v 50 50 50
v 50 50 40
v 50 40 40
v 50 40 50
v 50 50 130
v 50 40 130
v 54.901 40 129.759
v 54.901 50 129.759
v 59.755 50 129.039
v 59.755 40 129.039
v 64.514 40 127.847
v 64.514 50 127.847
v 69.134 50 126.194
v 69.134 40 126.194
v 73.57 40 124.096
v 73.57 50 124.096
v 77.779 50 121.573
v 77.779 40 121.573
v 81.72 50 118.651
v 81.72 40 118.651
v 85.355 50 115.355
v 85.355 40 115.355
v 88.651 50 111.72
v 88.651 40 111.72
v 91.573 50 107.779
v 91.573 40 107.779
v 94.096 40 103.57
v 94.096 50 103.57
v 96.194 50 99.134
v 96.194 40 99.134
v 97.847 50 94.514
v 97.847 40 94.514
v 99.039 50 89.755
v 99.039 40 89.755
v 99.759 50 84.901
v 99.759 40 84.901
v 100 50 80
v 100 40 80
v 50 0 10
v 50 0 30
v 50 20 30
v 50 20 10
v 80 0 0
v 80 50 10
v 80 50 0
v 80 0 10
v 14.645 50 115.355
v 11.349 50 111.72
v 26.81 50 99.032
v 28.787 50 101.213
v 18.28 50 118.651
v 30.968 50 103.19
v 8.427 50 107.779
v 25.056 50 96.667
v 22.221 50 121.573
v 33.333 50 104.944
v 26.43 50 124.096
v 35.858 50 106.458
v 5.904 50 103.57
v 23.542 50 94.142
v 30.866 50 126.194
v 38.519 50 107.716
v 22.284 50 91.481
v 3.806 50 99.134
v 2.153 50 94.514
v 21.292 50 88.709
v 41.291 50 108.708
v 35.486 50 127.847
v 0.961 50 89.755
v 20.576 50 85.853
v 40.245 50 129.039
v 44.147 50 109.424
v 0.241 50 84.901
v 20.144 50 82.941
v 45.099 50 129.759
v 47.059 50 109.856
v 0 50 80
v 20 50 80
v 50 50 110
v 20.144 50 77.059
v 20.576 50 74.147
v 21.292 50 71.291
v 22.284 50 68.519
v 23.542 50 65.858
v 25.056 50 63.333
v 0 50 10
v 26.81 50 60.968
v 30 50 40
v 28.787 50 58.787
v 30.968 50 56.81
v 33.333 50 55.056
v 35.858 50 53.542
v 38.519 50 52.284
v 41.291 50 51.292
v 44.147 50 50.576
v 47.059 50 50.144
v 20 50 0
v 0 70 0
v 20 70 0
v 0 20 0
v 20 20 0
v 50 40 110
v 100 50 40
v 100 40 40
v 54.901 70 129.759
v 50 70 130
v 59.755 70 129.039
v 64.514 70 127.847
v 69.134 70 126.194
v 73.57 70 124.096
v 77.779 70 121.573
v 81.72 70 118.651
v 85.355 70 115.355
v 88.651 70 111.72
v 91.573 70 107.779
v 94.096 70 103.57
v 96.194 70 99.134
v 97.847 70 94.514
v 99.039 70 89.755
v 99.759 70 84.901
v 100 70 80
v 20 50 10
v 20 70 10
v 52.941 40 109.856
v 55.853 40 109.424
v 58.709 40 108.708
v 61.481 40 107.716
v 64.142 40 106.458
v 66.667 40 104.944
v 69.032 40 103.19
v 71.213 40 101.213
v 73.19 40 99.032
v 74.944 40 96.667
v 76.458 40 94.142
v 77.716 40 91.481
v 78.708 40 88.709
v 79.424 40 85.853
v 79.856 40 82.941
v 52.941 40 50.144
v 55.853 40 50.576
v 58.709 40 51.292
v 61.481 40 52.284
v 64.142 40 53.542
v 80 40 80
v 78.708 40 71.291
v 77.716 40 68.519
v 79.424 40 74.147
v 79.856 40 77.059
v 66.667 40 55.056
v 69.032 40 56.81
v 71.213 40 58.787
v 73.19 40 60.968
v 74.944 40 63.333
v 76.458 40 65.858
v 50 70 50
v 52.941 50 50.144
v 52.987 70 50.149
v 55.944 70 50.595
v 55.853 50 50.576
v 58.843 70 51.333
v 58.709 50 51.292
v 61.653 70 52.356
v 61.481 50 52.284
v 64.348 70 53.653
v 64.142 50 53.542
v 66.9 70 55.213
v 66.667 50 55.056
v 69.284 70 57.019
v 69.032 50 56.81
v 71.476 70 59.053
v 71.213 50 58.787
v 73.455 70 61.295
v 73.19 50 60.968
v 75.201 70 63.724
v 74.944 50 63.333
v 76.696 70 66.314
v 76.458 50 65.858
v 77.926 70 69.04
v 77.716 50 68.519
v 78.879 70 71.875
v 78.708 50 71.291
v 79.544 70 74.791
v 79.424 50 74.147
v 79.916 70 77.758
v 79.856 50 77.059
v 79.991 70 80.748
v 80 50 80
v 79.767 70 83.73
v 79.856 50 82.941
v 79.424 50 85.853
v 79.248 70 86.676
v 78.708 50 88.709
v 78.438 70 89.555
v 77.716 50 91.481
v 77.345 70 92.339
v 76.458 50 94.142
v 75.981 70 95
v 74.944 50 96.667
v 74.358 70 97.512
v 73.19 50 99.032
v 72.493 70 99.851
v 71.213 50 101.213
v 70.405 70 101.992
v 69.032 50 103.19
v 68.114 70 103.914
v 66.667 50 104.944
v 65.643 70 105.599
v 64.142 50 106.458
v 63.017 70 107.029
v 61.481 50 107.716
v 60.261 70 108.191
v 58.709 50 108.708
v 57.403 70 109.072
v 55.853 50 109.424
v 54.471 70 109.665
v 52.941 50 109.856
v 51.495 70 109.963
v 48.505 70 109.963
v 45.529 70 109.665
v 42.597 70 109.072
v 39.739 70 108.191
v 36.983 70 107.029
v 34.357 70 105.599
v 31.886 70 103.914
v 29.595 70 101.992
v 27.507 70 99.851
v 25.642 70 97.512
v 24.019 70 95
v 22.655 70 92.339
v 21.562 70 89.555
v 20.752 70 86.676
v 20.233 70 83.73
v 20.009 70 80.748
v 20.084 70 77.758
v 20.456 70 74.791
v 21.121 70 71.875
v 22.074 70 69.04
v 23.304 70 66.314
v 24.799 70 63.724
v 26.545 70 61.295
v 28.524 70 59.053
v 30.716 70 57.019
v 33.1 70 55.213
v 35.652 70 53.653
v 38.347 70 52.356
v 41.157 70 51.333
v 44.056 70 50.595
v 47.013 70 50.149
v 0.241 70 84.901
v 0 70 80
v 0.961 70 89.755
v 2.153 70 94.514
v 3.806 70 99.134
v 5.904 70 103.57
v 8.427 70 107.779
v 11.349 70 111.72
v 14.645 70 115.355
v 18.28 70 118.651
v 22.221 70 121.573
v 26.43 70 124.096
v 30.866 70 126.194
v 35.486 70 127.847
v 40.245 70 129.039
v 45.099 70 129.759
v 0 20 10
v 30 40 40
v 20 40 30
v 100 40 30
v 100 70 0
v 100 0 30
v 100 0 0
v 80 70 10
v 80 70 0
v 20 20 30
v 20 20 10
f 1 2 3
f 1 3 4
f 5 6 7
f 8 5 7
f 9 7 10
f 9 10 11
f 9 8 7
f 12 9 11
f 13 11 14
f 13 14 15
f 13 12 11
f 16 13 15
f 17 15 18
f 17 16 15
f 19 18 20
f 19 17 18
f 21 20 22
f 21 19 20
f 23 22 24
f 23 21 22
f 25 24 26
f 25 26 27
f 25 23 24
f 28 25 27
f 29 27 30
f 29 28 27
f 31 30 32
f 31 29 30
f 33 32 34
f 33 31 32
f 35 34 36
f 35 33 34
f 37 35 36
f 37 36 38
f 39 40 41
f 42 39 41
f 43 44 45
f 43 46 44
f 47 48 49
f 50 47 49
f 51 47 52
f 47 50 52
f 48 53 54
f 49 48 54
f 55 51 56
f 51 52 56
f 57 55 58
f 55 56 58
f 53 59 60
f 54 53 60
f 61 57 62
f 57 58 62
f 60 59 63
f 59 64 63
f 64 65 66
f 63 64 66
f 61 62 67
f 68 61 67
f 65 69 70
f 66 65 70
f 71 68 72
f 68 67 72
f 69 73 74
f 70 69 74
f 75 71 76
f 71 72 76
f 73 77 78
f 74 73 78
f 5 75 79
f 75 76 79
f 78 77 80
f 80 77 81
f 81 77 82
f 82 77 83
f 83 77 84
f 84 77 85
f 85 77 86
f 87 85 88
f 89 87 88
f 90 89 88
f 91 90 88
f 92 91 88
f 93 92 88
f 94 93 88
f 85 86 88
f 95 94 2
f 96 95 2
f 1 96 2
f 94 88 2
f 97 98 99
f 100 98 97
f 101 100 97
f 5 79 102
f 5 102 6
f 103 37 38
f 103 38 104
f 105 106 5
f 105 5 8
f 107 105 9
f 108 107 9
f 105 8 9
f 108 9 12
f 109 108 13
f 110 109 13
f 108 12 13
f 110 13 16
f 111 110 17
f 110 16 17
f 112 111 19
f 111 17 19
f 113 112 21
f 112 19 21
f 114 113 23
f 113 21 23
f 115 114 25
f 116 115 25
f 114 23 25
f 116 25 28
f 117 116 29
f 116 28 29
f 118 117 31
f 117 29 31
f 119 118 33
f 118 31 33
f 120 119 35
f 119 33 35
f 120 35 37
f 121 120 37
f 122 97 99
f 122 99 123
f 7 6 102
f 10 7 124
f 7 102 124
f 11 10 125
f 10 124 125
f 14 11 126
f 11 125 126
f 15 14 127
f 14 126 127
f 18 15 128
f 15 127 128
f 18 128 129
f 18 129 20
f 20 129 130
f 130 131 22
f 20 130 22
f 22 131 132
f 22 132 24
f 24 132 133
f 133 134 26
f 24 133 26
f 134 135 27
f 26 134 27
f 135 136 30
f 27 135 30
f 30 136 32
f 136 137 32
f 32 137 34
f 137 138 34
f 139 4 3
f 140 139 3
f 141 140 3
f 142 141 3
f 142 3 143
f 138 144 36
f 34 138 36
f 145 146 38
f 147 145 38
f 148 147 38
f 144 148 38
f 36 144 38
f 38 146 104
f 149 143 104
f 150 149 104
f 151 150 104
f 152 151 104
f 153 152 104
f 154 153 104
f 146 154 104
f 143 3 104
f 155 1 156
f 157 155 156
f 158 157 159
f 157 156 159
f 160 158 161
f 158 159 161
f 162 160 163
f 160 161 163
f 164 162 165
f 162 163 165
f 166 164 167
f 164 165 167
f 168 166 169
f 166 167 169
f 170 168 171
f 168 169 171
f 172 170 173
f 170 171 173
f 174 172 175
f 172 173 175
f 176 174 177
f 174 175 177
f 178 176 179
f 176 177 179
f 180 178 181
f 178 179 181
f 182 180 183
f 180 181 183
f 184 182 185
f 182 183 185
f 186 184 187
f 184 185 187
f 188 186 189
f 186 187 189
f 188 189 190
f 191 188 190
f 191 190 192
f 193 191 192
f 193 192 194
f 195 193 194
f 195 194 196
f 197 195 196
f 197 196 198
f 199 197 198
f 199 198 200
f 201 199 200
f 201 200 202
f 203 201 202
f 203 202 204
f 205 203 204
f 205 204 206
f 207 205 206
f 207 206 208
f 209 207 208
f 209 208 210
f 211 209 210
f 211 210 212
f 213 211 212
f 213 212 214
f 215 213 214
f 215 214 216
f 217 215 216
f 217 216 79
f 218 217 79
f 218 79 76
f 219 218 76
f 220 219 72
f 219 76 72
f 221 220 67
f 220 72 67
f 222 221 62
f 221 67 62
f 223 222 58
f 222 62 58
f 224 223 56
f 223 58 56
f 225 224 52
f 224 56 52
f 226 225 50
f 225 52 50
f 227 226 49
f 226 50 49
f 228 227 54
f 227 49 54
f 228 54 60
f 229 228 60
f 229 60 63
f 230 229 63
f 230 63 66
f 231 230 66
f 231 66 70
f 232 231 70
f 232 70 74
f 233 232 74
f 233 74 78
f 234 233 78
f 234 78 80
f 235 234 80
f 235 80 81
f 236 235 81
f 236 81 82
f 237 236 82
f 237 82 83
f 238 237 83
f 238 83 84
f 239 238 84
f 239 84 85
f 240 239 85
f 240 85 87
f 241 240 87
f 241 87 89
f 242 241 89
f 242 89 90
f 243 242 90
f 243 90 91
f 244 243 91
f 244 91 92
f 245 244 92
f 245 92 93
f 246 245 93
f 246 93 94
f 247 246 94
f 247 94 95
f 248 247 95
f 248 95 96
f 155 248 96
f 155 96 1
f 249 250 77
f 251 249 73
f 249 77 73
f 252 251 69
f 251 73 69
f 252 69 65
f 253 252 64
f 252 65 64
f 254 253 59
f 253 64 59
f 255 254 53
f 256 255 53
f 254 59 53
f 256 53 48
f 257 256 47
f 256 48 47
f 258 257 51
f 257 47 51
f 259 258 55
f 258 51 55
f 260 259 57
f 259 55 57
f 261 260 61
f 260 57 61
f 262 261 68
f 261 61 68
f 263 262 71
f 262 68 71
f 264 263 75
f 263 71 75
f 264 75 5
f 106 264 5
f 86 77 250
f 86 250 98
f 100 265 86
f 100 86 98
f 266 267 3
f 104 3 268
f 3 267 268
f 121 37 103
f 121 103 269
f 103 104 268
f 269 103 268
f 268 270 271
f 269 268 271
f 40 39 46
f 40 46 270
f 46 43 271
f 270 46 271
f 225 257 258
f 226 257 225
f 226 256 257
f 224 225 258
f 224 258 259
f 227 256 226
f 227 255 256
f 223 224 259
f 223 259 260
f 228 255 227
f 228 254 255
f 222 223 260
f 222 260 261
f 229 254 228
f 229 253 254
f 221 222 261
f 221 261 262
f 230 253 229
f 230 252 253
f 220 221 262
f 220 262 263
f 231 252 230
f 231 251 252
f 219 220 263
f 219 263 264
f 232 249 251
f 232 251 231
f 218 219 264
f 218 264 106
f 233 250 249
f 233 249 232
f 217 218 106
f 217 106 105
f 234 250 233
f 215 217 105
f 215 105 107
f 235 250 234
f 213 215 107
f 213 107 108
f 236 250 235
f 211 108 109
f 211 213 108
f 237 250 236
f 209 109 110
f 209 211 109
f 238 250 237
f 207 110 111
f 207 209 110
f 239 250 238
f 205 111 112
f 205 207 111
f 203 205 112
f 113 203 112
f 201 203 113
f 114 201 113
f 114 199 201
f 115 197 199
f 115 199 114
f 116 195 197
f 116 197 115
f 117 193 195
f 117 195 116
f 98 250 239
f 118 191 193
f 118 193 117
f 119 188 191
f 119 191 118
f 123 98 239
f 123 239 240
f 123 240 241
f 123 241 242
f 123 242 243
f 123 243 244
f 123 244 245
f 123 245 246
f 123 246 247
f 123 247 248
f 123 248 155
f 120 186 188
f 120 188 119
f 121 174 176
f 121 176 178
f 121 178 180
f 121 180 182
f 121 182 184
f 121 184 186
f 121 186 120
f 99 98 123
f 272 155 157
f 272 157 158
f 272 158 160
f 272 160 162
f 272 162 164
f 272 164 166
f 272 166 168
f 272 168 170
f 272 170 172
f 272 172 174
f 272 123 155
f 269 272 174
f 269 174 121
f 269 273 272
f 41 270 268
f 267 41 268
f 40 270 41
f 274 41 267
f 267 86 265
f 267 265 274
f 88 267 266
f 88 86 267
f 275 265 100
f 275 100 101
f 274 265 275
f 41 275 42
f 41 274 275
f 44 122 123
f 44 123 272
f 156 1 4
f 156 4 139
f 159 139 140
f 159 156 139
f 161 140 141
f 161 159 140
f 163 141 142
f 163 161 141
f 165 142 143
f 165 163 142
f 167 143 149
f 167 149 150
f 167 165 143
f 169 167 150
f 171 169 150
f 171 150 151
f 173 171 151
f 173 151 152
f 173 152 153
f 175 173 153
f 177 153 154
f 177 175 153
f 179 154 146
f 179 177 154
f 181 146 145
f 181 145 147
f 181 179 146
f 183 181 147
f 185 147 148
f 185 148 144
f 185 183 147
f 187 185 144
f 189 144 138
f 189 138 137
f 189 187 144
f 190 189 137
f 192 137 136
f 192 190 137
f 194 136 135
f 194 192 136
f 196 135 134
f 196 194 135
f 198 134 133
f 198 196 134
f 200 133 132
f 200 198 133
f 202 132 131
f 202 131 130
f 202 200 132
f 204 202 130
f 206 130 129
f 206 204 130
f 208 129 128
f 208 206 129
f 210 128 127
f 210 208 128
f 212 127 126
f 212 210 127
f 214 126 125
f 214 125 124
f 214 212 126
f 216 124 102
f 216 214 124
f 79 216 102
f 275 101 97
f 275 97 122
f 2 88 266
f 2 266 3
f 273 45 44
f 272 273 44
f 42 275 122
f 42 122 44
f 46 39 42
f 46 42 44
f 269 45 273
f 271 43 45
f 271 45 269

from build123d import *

# Parameters (mm, degrees)
SKETCH1_W           = 100
SKETCH1_H           = 40
BOSS_EXTRUDE1_DEPTH = 30
SKETCH2_W           = 50
SKETCH2_H           = 20
CUT_EXTRUDE1_DEPTH  = 30
SKETCH3_W           = 60
SKETCH3_H           = 10
CUT_EXTRUDE3_DEPTH  = 110
BOSS_EXTRUDE2_DEPTH = 10
SKETCH5_W           = 100
SKETCH5_H           = 10
BOSS_EXTRUDE3_DEPTH = 10
CUT_EXTRUDE4_DEPTH  = 45
SKETCH7_W           = 100
SKETCH7_H           = 130
BOSS_EXTRUDE4_DEPTH = 20
SKETCH8_R           = 30
CUT_EXTRUDE5_DEPTH  = 20
CUT_EXTRUDE6_DEPTH  = 20
BOSS_EXTRUDE5_DEPTH = 10
SKETCH12_W          = 60
SKETCH12_H          = 10
CUT_EXTRUDE9_DEPTH  = 56


with BuildPart() as part:
    # Sketch1 → Boss-Extrude1 (new body)
    with BuildSketch(Plane.XY):
        with Locations((50, 20)):
            Rectangle(SKETCH1_W, SKETCH1_H)
    extrude(amount=BOSS_EXTRUDE1_DEPTH)

    # Sketch2 → Cut-Extrude1 (cut)
    with BuildSketch(Plane.XY.offset(30)):
        with Locations((25, 10)):
            Rectangle(SKETCH2_W, SKETCH2_H)
    extrude(amount=-CUT_EXTRUDE1_DEPTH, mode=Mode.SUBTRACT)

    # Sketch3 → Cut-Extrude3 (cut)
    with BuildSketch(Plane(origin=(0, 40, 0), x_dir=(1, 0, 0), z_dir=(0, 1, 0))):
        with Locations((50, -5)):
            Rectangle(SKETCH3_W, SKETCH3_H)
    extrude(amount=-CUT_EXTRUDE3_DEPTH, mode=Mode.SUBTRACT)

    # Sketch4 → Boss-Extrude2 (add)
    with BuildSketch(Plane(origin=(0, 40, 0), x_dir=(1, 0, 0), z_dir=(0, 1, 0))):
        Polygon((100, 0), (100, -30), (0, -30), (0, 0), (20, 0), (20, -10), (80, -10), (80, 0), align=None)
    extrude(amount=BOSS_EXTRUDE2_DEPTH)

    # Sketch5 → Boss-Extrude3 (add)
    with BuildSketch(Plane.XY.offset(30)):
        with Locations((50, 45)):
            Rectangle(SKETCH5_W, SKETCH5_H)
    extrude(amount=BOSS_EXTRUDE3_DEPTH)

    # Sketch6 → Cut-Extrude4 (cut)
    with BuildSketch(Plane(origin=(0, 50, 0), x_dir=(1, 0, 0), z_dir=(0, 1, 0))):
        Polygon((0, -10), (30, -40), (0, -40), align=None)
    extrude(amount=-CUT_EXTRUDE4_DEPTH, mode=Mode.SUBTRACT)

    # Sketch7 → Boss-Extrude4 (add)
    with BuildSketch(Plane(origin=(0, 50, 0), x_dir=(1, 0, 0), z_dir=(0, 1, 0))):
        with Locations((50, -65)):
            Rectangle(SKETCH7_W, SKETCH7_H)
    extrude(amount=BOSS_EXTRUDE4_DEPTH)

    # Sketch8 → Cut-Extrude5 (cut)
    with BuildSketch(Plane.XZ.offset(-50)):
        with Locations(Location((50, 80, 0), (0, 0, 270))):
            Circle(SKETCH8_R)
    extrude(amount=-CUT_EXTRUDE5_DEPTH, mode=Mode.SUBTRACT)

    # Sketch9 → Cut-Extrude6 (cut)
    with BuildSketch(Plane(origin=(0, 50, 0), x_dir=(-1, 0, 0), z_dir=(0, -1, 0))):
        with BuildLine():
            Line((0, -130), (0, -80))
            ThreePointArc((0, -80), (-14.644660941, -115.355339059), (-50, -130))
            Line((-50, -130), (0, -130))
        make_face()
        with BuildLine():
            Line((-100, -130), (-50, -130))
            ThreePointArc((-50, -130), (-85.355339059, -115.355339059), (-100, -80))
            Line((-100, -80), (-100, -130))
        make_face()
    extrude(amount=-CUT_EXTRUDE6_DEPTH, mode=Mode.SUBTRACT)

    # Sketch10 → Boss-Extrude5 (add)
    with BuildSketch(Plane(origin=(0, 50, 0), x_dir=(-1, 0, 0), z_dir=(0, -1, 0))):
        with BuildLine():
            Line((-50, -110), (-50, -130))
            ThreePointArc((-50, -130), (-85.355339059, -115.355339059), (-100, -80))
            Line((-100, -80), (-100, -40))
            Line((-100, -40), (-50, -40))
            Line((-50, -40), (-50, -50))
            ThreePointArc((-50, -50), (-80, -80), (-50, -110))
        make_face()
    extrude(amount=BOSS_EXTRUDE5_DEPTH)

    # Sketch12 → Cut-Extrude9 (cut)
    with BuildSketch(Plane.XZ.offset(-50)):
        with Locations((50, 5)):
            Rectangle(SKETCH12_W, SKETCH12_H)
    extrude(amount=-CUT_EXTRUDE9_DEPTH, mode=Mode.SUBTRACT)


solid = part.part
